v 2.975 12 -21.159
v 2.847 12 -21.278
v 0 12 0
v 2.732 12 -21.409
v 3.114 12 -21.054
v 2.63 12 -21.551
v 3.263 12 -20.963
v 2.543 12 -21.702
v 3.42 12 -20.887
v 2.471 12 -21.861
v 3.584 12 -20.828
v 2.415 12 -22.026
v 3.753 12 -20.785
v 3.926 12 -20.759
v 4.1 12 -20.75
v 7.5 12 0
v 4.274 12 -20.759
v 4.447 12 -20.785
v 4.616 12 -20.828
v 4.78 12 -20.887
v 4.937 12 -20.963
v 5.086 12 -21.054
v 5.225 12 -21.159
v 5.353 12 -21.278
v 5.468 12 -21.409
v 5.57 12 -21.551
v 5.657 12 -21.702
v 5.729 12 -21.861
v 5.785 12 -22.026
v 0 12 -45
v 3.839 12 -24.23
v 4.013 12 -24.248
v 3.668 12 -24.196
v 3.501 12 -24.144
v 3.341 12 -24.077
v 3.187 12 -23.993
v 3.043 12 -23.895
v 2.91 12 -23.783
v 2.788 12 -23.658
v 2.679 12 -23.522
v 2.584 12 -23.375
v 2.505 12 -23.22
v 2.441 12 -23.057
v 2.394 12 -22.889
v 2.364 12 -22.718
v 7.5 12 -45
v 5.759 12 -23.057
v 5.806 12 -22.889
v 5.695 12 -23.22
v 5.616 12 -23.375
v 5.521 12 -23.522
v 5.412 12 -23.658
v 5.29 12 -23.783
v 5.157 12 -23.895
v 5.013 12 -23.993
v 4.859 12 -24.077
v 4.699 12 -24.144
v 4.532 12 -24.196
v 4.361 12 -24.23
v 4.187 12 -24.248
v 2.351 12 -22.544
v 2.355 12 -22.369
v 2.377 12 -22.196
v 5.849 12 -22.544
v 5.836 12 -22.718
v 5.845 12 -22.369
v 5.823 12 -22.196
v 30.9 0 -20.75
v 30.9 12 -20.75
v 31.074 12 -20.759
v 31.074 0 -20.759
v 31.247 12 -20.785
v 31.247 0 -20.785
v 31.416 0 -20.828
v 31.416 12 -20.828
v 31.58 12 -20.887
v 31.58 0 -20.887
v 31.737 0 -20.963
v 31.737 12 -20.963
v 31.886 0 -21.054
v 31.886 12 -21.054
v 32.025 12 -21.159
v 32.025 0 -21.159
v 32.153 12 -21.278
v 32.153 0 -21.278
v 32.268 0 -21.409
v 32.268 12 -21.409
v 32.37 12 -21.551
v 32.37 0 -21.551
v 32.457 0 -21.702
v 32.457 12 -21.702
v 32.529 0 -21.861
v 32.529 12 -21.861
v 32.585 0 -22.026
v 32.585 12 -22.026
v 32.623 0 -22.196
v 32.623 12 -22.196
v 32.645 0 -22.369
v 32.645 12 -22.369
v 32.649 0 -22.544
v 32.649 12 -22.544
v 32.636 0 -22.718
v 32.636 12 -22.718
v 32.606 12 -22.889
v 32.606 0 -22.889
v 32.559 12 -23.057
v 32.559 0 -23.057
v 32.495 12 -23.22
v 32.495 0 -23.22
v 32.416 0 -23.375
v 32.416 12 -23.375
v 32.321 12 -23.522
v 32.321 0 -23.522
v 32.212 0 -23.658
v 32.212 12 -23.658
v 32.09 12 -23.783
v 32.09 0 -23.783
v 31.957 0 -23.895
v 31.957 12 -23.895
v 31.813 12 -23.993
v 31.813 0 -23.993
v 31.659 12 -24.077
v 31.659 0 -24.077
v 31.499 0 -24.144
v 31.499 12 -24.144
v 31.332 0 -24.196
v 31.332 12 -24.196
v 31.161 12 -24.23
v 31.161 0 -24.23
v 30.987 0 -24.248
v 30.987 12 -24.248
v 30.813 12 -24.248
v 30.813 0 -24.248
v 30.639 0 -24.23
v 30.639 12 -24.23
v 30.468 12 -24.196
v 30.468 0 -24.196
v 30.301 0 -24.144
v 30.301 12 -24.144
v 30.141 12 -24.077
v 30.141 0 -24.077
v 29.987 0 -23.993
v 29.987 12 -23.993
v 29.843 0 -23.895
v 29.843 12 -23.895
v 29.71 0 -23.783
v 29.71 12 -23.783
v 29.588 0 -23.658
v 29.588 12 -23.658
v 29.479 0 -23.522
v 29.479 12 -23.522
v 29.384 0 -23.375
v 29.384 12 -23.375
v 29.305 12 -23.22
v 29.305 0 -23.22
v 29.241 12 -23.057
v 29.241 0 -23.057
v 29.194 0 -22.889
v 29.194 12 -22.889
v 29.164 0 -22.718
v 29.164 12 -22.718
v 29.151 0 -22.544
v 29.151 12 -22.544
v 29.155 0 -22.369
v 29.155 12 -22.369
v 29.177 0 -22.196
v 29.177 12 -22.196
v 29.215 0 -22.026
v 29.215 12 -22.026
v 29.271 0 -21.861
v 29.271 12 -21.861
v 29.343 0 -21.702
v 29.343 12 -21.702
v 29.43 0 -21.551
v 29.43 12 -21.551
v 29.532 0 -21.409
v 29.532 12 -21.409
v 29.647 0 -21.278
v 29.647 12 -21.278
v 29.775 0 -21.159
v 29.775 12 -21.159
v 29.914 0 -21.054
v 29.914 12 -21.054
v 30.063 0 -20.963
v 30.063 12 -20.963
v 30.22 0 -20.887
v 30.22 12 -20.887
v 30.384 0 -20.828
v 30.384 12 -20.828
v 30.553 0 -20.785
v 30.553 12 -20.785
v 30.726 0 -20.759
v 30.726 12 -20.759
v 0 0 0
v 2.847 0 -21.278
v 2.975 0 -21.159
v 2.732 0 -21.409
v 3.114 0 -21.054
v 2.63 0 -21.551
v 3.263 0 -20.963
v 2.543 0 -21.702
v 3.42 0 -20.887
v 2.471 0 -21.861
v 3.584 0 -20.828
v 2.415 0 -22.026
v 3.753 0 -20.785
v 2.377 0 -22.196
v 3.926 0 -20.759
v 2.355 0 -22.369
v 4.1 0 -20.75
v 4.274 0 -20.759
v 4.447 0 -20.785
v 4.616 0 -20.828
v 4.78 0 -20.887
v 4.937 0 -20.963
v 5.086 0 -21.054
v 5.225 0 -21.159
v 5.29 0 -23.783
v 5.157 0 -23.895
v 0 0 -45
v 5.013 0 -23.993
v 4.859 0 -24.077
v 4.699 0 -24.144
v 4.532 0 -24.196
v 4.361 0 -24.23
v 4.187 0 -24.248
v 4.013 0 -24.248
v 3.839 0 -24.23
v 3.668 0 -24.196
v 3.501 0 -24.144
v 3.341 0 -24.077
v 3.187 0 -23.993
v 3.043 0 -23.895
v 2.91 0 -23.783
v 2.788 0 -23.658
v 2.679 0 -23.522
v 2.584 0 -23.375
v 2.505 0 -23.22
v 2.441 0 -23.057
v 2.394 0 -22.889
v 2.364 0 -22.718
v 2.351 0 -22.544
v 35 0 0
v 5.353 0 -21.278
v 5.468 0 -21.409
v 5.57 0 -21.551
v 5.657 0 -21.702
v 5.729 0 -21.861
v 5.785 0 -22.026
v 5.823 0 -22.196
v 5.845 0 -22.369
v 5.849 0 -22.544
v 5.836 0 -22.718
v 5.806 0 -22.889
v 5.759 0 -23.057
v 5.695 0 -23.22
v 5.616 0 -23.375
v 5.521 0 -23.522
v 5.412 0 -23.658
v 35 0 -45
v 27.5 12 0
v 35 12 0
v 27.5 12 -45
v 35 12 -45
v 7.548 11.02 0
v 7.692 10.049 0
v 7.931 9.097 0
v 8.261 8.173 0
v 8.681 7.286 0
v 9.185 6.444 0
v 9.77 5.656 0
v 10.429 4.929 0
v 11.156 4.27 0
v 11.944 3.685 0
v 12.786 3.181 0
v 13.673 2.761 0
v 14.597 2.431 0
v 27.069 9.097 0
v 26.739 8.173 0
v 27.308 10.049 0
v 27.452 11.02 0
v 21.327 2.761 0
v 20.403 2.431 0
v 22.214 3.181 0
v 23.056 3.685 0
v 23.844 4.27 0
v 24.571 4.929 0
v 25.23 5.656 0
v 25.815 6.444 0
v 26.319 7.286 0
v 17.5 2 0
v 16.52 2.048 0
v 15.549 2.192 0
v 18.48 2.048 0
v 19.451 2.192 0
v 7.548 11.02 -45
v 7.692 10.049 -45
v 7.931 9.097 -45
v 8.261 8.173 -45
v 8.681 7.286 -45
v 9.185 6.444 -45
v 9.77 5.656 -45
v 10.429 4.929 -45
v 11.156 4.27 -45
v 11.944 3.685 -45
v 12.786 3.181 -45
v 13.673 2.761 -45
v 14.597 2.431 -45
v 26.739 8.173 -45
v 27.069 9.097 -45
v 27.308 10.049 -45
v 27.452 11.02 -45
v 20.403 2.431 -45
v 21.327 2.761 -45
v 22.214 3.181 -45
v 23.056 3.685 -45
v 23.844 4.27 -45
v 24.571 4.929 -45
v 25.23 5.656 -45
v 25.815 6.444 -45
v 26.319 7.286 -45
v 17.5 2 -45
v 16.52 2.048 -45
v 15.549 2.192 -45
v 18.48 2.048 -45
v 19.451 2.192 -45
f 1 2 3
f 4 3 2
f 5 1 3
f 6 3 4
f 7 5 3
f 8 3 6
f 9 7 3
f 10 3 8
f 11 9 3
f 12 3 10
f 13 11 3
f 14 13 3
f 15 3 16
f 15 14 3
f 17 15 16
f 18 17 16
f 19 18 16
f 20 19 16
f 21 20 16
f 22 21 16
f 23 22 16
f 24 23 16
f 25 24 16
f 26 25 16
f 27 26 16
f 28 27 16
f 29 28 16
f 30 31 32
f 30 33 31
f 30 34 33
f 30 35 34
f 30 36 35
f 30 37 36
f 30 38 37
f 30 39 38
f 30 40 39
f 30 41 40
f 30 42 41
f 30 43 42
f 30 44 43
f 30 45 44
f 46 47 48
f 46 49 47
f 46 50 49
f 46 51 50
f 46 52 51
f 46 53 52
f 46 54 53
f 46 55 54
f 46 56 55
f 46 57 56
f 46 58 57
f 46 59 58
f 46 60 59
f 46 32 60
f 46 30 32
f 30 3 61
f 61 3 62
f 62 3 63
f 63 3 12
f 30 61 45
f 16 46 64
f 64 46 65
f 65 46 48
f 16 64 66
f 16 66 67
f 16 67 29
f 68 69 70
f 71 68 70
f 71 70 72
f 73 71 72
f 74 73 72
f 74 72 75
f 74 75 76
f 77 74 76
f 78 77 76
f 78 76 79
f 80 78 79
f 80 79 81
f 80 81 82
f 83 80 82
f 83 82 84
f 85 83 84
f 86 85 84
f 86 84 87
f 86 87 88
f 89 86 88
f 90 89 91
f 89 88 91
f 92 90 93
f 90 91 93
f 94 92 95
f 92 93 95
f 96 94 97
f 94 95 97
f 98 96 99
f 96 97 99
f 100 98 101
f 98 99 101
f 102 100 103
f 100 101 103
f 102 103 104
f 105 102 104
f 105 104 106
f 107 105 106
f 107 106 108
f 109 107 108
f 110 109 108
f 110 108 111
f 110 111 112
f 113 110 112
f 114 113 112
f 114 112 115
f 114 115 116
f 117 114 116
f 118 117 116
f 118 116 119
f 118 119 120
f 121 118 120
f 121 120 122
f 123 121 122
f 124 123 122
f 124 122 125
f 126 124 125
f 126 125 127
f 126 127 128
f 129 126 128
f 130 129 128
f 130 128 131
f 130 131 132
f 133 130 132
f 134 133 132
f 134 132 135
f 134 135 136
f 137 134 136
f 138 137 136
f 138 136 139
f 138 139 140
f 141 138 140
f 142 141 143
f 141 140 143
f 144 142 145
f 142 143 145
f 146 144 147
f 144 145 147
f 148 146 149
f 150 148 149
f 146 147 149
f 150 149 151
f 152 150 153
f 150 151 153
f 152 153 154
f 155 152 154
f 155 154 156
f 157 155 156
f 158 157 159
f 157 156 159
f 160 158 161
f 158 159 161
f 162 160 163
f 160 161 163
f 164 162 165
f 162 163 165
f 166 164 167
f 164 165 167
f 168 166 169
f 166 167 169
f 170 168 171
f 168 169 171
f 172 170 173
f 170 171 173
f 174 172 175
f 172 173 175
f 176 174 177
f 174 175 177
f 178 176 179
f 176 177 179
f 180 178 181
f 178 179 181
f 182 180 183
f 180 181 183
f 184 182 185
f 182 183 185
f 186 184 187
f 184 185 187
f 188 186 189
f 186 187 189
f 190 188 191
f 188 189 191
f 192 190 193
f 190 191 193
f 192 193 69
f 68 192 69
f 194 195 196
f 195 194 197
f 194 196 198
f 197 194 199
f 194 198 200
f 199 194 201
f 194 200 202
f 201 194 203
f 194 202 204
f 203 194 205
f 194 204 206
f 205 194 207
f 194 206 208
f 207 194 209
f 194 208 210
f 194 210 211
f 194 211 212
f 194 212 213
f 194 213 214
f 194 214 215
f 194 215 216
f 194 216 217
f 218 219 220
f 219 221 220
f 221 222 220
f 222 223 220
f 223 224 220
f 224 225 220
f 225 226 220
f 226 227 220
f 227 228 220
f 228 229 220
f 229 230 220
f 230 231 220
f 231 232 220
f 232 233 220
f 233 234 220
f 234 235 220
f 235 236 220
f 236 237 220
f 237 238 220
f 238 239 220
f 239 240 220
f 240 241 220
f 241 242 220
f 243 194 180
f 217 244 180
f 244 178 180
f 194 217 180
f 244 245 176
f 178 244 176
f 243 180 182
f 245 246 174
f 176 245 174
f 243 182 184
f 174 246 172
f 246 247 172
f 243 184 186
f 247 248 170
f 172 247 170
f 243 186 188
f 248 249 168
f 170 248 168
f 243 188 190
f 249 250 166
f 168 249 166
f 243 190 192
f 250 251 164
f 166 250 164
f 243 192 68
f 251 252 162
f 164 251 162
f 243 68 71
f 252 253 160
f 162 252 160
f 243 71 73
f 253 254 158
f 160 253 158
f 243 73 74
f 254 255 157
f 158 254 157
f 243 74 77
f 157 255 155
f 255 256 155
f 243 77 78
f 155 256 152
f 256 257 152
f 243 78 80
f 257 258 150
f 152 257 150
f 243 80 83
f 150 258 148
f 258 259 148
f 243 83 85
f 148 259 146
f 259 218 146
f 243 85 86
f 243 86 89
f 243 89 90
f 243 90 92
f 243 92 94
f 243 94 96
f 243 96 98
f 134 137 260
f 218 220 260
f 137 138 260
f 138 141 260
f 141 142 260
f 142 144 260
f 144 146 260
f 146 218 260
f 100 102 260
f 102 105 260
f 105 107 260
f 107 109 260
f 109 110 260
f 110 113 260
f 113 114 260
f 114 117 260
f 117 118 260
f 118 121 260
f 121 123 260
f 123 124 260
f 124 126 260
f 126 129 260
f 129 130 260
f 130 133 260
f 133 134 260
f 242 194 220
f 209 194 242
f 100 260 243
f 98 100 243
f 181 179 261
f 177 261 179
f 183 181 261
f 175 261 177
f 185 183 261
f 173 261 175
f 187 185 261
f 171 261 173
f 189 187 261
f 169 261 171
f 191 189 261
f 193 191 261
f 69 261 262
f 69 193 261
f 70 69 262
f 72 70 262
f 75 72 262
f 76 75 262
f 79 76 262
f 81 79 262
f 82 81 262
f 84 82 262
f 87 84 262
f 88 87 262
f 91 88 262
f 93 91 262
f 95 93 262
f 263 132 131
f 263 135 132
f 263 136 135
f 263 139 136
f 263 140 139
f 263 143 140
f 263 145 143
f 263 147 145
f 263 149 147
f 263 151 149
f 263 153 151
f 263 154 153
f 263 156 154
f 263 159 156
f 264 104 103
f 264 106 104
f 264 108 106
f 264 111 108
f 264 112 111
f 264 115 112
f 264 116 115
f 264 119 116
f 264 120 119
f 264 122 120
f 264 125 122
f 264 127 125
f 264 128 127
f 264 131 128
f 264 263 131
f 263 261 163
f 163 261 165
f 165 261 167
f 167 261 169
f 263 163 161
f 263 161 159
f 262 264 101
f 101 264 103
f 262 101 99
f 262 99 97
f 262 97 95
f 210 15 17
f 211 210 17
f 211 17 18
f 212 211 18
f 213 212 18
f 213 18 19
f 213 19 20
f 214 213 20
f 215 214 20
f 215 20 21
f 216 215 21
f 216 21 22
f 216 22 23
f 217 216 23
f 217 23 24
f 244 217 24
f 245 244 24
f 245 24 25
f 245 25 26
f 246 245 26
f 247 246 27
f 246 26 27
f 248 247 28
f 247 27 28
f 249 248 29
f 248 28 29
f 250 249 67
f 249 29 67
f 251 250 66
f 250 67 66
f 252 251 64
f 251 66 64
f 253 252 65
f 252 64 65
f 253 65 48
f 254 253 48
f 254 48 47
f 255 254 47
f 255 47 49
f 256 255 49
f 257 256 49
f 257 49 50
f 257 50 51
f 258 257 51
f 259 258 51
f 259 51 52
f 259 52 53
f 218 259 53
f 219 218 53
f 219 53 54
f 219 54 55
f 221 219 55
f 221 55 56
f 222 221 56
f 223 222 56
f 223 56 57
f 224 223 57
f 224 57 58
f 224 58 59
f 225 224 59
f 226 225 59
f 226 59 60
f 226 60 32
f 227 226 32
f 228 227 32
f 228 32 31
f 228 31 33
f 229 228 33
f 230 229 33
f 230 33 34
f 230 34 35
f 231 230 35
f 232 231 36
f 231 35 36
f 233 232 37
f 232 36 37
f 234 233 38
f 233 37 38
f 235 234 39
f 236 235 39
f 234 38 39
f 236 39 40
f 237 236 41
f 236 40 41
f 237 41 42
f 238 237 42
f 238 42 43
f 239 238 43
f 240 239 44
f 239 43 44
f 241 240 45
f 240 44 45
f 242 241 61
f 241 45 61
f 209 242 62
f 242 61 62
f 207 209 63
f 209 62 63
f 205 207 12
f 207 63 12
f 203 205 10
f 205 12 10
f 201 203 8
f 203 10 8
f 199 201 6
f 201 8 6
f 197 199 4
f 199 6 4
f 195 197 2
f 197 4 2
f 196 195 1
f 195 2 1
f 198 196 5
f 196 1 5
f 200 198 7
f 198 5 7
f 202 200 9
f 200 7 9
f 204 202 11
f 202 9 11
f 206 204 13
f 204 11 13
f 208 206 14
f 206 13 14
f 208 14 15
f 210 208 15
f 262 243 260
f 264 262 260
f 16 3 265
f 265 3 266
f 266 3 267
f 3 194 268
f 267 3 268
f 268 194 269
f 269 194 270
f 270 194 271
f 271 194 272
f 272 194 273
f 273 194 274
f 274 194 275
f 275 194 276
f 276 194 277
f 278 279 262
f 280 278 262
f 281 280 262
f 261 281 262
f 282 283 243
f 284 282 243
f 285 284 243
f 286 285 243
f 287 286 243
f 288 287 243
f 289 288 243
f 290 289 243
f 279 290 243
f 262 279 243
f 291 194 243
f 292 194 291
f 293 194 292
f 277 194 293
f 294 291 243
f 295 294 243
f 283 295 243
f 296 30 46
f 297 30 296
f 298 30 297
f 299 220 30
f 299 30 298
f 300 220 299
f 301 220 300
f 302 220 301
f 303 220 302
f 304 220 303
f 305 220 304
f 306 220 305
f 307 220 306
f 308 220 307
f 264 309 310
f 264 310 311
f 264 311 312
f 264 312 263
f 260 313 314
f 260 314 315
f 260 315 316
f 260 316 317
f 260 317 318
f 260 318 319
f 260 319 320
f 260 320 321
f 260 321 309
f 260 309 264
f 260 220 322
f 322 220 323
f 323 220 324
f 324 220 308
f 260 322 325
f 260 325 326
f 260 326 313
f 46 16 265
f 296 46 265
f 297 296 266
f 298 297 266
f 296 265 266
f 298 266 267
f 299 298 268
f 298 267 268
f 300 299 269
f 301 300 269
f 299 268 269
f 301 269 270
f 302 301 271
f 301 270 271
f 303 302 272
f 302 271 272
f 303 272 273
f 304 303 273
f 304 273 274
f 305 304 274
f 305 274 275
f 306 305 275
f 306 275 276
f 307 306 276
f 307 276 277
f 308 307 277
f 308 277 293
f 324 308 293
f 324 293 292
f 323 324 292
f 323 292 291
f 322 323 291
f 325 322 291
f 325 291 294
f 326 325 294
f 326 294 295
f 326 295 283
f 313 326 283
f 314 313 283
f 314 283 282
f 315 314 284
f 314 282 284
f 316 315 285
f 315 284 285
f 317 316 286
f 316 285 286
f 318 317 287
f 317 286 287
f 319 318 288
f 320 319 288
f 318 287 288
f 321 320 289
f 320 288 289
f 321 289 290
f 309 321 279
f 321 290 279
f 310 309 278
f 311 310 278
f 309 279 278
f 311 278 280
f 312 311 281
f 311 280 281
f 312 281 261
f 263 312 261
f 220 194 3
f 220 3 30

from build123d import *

# Parameters (mm, degrees)
SKETCH1_W           = 35
SKETCH1_H           = 45
BOSS_EXTRUDE1_DEPTH = 12
SKETCH2_R           = 10
CUT_EXTRUDE1_DEPTH  = 59.258046655
SKETCH3_R           = 1.75
CUT_EXTRUDE2_DEPTH  = 25


with BuildPart() as part:
    # Sketch1 → Boss-Extrude1 (new body)
    with BuildSketch(Plane(origin=(0, 0, 0), x_dir=(1, 0, 0), z_dir=(0, 1, 0))):
        with Locations((17.5, 22.5)):
            Rectangle(SKETCH1_W, SKETCH1_H)
    extrude(amount=BOSS_EXTRUDE1_DEPTH)

    # Sketch2 → Cut-Extrude1 (cut, through all)
    with BuildSketch(Plane.XY):
        with Locations((17.5, 12)):
            Circle(SKETCH2_R)
    extrude(amount=-CUT_EXTRUDE1_DEPTH, mode=Mode.SUBTRACT)

    # Sketch3 → Cut-Extrude2 (cut)
    with BuildSketch(Plane(origin=(0, 12, 0), x_dir=(1, 0, 0), z_dir=(0, 1, 0))):
        with Locations(Location((30.9, 22.5, 0), (0, 0, 270))):
            Circle(SKETCH3_R)
        with Locations(Location((4.1, 22.5, 0), (0, 0, 270))):
            Circle(SKETCH3_R)
    extrude(amount=-CUT_EXTRUDE2_DEPTH, mode=Mode.SUBTRACT)


solid = part.part
